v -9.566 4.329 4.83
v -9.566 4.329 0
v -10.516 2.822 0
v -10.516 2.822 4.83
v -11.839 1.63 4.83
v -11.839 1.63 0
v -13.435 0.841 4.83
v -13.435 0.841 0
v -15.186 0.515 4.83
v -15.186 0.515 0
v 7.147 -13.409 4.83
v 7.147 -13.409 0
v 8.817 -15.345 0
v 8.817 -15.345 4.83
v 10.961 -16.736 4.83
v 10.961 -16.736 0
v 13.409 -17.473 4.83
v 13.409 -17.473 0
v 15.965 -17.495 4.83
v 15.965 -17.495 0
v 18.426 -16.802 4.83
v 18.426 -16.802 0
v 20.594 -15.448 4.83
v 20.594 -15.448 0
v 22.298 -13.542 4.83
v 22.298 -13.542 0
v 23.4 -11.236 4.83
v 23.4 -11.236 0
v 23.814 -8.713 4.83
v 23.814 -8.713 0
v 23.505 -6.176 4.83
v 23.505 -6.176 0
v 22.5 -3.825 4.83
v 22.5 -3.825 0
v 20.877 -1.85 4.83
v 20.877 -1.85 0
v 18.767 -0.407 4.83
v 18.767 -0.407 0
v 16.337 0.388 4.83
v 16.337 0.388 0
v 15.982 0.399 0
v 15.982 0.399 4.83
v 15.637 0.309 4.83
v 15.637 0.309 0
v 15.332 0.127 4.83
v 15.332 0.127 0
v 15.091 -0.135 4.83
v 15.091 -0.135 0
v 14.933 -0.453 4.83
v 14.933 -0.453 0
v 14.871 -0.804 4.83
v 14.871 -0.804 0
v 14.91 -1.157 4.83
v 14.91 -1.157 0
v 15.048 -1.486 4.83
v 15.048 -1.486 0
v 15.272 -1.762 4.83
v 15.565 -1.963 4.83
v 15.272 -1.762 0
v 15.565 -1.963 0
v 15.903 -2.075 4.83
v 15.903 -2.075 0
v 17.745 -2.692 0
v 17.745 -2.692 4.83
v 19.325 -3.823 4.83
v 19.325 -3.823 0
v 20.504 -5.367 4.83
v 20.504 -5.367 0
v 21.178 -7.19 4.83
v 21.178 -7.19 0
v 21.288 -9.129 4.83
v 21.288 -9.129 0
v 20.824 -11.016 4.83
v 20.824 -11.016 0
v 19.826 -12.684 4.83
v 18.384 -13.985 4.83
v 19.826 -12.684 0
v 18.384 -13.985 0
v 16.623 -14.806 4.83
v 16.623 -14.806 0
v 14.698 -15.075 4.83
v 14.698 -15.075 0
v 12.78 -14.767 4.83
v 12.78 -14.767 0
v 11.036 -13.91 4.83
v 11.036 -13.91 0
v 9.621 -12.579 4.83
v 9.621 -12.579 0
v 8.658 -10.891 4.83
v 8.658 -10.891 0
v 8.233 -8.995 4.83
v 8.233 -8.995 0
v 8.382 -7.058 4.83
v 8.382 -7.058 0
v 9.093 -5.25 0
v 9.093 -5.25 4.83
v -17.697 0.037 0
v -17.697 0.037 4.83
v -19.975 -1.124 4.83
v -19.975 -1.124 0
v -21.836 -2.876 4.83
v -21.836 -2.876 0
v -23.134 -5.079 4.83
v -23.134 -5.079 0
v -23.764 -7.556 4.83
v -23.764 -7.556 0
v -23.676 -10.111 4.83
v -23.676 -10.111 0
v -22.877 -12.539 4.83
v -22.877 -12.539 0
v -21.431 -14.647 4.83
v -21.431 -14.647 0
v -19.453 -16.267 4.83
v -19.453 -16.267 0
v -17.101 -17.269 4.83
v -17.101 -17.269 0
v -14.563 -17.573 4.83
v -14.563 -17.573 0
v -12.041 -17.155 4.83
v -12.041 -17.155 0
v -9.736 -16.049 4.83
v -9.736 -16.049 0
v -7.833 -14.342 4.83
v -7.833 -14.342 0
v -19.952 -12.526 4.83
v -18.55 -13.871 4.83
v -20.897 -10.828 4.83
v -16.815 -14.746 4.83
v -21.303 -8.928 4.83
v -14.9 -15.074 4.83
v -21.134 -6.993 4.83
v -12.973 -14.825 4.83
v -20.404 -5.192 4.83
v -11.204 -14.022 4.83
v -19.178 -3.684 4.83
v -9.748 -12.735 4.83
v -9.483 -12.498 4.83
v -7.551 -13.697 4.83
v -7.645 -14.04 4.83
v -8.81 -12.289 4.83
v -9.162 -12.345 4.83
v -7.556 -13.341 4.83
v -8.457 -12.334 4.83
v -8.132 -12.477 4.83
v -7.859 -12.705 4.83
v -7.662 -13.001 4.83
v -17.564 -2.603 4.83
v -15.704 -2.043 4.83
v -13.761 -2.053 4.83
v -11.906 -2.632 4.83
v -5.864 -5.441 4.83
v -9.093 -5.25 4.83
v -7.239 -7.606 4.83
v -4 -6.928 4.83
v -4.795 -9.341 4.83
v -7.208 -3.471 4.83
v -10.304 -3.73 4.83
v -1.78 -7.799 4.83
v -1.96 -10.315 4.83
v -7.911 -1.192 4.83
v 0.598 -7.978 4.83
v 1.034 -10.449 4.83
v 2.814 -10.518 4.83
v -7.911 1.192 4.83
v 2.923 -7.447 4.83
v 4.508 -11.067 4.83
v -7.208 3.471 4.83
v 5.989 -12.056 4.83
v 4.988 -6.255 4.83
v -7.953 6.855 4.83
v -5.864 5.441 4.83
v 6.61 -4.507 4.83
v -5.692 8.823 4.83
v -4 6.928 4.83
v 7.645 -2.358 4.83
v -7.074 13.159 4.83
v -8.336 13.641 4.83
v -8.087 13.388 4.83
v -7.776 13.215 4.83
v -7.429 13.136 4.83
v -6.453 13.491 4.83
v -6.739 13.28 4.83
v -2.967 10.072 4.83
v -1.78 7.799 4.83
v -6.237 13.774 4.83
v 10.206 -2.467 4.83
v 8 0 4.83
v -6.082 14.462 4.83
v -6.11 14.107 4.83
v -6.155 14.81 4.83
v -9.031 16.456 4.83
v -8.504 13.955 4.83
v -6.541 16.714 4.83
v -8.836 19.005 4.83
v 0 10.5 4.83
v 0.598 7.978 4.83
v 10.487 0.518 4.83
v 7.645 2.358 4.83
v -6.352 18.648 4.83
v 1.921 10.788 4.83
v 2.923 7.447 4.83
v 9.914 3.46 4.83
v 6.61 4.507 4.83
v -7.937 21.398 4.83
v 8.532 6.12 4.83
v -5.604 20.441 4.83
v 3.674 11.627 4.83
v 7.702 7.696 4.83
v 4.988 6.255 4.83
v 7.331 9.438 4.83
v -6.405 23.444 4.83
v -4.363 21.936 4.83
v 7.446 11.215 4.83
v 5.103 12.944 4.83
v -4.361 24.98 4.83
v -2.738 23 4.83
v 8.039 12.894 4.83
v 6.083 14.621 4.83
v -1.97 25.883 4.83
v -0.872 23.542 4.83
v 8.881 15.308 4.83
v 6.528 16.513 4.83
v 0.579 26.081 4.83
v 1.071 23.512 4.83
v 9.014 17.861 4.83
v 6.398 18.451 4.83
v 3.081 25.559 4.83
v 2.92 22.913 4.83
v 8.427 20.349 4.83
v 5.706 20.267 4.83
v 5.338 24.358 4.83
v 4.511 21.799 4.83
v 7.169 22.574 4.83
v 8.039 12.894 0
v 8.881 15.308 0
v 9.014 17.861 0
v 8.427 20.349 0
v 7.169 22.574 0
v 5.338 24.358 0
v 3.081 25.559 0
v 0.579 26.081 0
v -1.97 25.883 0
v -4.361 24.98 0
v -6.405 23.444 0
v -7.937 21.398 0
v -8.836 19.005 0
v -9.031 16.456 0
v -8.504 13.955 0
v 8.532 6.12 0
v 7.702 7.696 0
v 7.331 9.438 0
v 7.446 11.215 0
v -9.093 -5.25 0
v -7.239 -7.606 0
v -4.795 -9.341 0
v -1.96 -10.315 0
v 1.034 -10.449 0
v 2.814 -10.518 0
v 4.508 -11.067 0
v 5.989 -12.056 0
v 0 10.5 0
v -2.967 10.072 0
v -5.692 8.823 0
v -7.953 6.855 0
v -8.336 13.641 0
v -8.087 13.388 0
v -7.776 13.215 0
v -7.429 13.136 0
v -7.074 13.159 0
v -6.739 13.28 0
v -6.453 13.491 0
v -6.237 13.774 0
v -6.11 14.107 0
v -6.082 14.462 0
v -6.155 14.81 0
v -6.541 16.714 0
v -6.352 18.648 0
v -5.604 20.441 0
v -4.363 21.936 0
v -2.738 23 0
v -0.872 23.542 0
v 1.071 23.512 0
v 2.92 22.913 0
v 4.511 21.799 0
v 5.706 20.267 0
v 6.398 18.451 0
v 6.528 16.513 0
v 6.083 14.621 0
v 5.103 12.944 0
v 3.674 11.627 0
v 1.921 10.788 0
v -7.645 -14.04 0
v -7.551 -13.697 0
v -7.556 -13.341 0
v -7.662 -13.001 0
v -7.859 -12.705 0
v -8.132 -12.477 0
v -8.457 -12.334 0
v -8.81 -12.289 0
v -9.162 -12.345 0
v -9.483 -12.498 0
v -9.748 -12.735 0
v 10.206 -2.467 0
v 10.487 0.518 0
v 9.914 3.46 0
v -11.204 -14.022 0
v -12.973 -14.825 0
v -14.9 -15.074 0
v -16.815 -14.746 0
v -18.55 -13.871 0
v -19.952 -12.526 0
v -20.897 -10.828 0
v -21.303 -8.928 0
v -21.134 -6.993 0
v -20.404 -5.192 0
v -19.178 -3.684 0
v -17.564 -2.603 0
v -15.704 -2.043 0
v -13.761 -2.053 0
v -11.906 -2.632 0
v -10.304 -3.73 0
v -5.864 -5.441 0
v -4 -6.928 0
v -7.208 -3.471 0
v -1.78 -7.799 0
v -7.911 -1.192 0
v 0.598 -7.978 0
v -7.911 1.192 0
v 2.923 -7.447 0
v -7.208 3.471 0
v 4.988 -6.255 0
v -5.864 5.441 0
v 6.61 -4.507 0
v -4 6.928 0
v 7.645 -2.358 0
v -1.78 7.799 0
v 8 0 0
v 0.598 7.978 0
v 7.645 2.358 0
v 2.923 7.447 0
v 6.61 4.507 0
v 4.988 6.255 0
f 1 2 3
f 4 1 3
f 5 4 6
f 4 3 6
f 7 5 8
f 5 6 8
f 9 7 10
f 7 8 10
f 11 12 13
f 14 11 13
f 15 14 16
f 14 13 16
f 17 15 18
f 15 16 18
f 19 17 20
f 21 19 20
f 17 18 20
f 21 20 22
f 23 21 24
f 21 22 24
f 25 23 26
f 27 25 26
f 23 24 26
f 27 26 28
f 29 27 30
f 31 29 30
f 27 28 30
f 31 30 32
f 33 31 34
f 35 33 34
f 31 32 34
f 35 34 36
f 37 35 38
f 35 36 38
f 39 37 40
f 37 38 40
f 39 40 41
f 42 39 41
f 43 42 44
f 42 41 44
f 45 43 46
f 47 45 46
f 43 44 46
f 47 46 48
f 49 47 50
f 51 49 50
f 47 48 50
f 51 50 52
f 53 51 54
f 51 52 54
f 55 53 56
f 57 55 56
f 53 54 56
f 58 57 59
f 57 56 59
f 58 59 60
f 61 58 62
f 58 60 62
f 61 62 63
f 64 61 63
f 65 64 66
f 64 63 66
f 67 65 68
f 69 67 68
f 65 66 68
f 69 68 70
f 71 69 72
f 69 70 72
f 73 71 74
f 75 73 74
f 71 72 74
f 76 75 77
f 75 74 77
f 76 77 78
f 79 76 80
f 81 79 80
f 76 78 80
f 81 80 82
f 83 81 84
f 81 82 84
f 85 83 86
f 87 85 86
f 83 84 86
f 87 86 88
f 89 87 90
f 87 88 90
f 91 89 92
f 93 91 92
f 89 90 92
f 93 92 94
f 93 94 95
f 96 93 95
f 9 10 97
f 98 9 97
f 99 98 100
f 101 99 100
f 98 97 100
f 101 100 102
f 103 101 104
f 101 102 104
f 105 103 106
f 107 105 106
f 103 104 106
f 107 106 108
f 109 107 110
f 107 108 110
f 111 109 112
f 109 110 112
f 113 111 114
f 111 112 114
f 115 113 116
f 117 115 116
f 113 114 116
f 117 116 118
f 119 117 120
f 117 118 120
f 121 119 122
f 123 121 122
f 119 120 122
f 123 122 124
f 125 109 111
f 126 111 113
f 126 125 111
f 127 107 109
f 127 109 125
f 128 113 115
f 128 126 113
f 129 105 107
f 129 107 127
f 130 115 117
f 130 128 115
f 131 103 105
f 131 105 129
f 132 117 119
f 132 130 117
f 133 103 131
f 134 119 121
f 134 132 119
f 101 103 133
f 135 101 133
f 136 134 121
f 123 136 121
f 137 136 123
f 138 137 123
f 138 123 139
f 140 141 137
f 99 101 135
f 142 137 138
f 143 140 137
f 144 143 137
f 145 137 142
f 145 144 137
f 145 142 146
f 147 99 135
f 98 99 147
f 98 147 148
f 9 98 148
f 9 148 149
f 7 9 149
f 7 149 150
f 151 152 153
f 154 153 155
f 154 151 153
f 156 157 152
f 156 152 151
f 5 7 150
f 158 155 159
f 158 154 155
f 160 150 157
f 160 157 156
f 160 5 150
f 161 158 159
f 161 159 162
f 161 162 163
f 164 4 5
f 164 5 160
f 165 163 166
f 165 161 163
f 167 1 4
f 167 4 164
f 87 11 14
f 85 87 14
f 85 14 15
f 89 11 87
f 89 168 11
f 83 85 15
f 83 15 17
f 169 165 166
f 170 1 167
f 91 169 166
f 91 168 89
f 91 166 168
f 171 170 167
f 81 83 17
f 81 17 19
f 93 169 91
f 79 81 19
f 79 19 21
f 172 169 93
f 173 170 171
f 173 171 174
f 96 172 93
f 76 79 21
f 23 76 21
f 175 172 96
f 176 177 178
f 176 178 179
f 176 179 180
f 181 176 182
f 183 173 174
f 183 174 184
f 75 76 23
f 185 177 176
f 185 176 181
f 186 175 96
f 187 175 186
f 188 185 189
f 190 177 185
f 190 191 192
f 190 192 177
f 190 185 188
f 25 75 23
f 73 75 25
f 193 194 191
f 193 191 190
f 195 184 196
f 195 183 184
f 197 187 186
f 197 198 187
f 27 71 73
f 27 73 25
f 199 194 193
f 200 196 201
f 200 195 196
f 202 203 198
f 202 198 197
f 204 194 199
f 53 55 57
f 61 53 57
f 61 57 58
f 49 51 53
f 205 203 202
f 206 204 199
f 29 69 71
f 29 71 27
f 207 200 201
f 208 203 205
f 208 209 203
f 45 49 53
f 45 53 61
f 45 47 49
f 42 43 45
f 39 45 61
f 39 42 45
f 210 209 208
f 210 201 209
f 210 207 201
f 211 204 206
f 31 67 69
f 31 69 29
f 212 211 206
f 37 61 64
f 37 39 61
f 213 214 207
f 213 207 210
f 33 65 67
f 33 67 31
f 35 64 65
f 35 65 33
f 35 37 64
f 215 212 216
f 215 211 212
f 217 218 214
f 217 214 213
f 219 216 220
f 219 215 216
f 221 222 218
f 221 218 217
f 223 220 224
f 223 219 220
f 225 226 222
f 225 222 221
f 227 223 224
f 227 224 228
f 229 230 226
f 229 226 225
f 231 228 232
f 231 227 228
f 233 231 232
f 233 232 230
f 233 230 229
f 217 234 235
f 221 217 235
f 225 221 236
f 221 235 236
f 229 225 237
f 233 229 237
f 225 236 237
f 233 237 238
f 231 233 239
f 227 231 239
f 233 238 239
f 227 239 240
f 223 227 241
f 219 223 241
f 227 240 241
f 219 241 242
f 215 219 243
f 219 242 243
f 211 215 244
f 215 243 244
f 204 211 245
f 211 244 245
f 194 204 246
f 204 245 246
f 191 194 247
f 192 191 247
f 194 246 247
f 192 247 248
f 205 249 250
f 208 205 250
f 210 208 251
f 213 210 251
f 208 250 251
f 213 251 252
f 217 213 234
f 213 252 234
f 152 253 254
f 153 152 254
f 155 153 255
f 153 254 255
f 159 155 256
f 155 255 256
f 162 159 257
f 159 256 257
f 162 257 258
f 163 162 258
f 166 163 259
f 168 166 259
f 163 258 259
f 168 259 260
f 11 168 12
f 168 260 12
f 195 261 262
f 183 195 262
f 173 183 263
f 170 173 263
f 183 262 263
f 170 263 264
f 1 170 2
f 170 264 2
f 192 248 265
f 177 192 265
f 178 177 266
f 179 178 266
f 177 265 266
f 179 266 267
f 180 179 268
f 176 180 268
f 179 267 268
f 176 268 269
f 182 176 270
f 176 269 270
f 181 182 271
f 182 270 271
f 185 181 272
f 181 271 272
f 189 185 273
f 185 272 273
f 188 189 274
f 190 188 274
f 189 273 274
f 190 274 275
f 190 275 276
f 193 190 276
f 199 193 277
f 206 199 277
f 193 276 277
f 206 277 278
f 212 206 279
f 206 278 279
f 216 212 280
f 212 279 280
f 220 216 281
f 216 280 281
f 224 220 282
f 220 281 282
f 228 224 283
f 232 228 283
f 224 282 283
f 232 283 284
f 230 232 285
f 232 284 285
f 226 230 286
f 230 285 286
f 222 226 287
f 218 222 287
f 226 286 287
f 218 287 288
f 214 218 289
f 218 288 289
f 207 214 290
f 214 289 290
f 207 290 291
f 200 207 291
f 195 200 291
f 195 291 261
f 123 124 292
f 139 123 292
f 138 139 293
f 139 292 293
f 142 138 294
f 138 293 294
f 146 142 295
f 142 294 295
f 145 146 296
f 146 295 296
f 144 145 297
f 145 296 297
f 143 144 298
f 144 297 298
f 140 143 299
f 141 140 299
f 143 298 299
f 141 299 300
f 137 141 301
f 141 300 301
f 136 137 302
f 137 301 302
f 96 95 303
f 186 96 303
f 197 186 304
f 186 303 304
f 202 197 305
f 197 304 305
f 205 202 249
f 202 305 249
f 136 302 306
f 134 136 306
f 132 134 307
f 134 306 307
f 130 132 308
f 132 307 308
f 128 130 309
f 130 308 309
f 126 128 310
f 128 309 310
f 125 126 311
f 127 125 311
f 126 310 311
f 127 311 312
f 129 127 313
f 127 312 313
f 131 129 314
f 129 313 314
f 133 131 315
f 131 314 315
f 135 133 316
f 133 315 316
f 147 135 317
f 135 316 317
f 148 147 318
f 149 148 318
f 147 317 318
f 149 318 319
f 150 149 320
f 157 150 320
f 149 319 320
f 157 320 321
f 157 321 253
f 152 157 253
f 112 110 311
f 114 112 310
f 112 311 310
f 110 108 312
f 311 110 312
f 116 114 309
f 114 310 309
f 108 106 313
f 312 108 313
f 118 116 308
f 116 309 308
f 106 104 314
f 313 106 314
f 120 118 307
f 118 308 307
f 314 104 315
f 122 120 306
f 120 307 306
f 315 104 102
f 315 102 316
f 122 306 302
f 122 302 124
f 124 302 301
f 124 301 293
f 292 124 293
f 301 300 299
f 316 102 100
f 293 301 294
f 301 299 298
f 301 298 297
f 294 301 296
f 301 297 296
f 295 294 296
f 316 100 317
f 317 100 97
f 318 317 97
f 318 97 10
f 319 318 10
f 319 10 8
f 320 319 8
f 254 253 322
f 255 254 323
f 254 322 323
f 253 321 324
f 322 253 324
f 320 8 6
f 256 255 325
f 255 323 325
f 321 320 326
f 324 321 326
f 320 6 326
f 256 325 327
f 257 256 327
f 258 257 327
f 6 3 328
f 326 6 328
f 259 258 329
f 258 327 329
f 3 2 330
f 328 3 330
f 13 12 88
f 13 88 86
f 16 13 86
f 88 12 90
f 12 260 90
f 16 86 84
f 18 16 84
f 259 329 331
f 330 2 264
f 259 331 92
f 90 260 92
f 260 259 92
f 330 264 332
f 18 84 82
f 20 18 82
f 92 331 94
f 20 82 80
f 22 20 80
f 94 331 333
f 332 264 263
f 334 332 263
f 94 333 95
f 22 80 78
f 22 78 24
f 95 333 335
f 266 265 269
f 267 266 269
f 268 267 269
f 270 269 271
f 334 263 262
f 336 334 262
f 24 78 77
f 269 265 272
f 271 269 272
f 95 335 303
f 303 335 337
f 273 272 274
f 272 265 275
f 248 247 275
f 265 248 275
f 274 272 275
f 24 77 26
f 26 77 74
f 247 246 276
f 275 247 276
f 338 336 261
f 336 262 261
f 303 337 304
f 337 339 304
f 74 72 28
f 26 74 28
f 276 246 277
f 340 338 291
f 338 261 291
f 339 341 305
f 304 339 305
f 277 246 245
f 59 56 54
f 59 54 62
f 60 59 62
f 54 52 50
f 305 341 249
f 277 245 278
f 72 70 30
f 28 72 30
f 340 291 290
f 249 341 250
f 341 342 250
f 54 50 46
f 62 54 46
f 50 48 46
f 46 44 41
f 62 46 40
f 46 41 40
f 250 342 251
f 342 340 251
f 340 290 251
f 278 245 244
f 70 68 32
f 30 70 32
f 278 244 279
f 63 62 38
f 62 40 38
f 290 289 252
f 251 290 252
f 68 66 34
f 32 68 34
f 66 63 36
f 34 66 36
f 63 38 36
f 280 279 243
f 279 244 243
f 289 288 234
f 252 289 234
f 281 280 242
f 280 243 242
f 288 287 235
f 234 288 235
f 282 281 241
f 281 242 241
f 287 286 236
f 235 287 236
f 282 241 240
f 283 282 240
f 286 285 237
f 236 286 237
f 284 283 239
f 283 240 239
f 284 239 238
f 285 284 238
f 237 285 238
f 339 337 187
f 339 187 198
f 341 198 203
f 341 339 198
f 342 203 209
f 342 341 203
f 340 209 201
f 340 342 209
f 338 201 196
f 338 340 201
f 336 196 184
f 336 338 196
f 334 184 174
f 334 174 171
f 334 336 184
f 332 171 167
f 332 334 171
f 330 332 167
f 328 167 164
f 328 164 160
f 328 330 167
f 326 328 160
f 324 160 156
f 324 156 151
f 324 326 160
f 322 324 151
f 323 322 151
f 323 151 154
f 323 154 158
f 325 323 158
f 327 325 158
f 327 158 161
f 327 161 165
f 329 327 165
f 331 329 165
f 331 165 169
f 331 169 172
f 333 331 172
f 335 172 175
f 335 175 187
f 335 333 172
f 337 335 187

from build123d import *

# Parameters (mm, degrees)
F0_R     = 8
F1_DEPTH = 4.83


with BuildPart() as f1:
    # F0 (on Top) → F1 (new body)
    with BuildSketch(Plane.XY):
        with BuildLine():
            ThreePointArc((-6.154987, 14.809768), (3.756926, 22.415446), (0, 10.5))
            ThreePointArc((0, 10.5), (-5.692087, 8.823273), (-9.566255, 4.328598))
            ThreePointArc((-9.566255, 4.328598), (-11.838577, 1.629537), (-15.186217, 0.515226))
            ThreePointArc((-15.186217, 0.515226), (-22.876728, -12.539258), (-7.833031, -14.342228))
            ThreePointArc((-7.833031, -14.342228), (-7.987102, -12.581188), (-9.748142, -12.735259))
            ThreePointArc((-9.748142, -12.735259), (-21.290808, -7.95413), (-9.093267, -5.25))
            ThreePointArc((-9.093267, -5.25), (-4.795135, -9.341129), (1.034452, -10.448919))
            ThreePointArc((1.034452, -10.448919), (4.508068, -11.067277), (7.14691, -13.409263))
            ThreePointArc((7.14691, -13.409263), (22.29768, -13.542198), (16.337249, 0.38751))
            ThreePointArc((16.337249, 0.38751), (14.889179, -0.626439), (15.903129, -2.074509))
            ThreePointArc((15.903129, -2.074509), (17.533883, -14.461316), (9.093267, -5.25))
            ThreePointArc((9.093267, -5.25), (10.487222, 0.517856), (8.531804, 6.120321))
            ThreePointArc((8.531804, 6.120321), (7.330509, 9.43774), (8.039308, 12.894037))
            ThreePointArc((8.039308, 12.894037), (0.579048, 26.081456), (-8.504218, 13.954718))
            ThreePointArc((-8.504218, 13.954718), (-6.902077, 13.207627), (-6.154987, 14.809768))
        make_face()
        Circle(F0_R, mode=Mode.SUBTRACT)
    extrude(amount=F1_DEPTH)


solid = f1.part
